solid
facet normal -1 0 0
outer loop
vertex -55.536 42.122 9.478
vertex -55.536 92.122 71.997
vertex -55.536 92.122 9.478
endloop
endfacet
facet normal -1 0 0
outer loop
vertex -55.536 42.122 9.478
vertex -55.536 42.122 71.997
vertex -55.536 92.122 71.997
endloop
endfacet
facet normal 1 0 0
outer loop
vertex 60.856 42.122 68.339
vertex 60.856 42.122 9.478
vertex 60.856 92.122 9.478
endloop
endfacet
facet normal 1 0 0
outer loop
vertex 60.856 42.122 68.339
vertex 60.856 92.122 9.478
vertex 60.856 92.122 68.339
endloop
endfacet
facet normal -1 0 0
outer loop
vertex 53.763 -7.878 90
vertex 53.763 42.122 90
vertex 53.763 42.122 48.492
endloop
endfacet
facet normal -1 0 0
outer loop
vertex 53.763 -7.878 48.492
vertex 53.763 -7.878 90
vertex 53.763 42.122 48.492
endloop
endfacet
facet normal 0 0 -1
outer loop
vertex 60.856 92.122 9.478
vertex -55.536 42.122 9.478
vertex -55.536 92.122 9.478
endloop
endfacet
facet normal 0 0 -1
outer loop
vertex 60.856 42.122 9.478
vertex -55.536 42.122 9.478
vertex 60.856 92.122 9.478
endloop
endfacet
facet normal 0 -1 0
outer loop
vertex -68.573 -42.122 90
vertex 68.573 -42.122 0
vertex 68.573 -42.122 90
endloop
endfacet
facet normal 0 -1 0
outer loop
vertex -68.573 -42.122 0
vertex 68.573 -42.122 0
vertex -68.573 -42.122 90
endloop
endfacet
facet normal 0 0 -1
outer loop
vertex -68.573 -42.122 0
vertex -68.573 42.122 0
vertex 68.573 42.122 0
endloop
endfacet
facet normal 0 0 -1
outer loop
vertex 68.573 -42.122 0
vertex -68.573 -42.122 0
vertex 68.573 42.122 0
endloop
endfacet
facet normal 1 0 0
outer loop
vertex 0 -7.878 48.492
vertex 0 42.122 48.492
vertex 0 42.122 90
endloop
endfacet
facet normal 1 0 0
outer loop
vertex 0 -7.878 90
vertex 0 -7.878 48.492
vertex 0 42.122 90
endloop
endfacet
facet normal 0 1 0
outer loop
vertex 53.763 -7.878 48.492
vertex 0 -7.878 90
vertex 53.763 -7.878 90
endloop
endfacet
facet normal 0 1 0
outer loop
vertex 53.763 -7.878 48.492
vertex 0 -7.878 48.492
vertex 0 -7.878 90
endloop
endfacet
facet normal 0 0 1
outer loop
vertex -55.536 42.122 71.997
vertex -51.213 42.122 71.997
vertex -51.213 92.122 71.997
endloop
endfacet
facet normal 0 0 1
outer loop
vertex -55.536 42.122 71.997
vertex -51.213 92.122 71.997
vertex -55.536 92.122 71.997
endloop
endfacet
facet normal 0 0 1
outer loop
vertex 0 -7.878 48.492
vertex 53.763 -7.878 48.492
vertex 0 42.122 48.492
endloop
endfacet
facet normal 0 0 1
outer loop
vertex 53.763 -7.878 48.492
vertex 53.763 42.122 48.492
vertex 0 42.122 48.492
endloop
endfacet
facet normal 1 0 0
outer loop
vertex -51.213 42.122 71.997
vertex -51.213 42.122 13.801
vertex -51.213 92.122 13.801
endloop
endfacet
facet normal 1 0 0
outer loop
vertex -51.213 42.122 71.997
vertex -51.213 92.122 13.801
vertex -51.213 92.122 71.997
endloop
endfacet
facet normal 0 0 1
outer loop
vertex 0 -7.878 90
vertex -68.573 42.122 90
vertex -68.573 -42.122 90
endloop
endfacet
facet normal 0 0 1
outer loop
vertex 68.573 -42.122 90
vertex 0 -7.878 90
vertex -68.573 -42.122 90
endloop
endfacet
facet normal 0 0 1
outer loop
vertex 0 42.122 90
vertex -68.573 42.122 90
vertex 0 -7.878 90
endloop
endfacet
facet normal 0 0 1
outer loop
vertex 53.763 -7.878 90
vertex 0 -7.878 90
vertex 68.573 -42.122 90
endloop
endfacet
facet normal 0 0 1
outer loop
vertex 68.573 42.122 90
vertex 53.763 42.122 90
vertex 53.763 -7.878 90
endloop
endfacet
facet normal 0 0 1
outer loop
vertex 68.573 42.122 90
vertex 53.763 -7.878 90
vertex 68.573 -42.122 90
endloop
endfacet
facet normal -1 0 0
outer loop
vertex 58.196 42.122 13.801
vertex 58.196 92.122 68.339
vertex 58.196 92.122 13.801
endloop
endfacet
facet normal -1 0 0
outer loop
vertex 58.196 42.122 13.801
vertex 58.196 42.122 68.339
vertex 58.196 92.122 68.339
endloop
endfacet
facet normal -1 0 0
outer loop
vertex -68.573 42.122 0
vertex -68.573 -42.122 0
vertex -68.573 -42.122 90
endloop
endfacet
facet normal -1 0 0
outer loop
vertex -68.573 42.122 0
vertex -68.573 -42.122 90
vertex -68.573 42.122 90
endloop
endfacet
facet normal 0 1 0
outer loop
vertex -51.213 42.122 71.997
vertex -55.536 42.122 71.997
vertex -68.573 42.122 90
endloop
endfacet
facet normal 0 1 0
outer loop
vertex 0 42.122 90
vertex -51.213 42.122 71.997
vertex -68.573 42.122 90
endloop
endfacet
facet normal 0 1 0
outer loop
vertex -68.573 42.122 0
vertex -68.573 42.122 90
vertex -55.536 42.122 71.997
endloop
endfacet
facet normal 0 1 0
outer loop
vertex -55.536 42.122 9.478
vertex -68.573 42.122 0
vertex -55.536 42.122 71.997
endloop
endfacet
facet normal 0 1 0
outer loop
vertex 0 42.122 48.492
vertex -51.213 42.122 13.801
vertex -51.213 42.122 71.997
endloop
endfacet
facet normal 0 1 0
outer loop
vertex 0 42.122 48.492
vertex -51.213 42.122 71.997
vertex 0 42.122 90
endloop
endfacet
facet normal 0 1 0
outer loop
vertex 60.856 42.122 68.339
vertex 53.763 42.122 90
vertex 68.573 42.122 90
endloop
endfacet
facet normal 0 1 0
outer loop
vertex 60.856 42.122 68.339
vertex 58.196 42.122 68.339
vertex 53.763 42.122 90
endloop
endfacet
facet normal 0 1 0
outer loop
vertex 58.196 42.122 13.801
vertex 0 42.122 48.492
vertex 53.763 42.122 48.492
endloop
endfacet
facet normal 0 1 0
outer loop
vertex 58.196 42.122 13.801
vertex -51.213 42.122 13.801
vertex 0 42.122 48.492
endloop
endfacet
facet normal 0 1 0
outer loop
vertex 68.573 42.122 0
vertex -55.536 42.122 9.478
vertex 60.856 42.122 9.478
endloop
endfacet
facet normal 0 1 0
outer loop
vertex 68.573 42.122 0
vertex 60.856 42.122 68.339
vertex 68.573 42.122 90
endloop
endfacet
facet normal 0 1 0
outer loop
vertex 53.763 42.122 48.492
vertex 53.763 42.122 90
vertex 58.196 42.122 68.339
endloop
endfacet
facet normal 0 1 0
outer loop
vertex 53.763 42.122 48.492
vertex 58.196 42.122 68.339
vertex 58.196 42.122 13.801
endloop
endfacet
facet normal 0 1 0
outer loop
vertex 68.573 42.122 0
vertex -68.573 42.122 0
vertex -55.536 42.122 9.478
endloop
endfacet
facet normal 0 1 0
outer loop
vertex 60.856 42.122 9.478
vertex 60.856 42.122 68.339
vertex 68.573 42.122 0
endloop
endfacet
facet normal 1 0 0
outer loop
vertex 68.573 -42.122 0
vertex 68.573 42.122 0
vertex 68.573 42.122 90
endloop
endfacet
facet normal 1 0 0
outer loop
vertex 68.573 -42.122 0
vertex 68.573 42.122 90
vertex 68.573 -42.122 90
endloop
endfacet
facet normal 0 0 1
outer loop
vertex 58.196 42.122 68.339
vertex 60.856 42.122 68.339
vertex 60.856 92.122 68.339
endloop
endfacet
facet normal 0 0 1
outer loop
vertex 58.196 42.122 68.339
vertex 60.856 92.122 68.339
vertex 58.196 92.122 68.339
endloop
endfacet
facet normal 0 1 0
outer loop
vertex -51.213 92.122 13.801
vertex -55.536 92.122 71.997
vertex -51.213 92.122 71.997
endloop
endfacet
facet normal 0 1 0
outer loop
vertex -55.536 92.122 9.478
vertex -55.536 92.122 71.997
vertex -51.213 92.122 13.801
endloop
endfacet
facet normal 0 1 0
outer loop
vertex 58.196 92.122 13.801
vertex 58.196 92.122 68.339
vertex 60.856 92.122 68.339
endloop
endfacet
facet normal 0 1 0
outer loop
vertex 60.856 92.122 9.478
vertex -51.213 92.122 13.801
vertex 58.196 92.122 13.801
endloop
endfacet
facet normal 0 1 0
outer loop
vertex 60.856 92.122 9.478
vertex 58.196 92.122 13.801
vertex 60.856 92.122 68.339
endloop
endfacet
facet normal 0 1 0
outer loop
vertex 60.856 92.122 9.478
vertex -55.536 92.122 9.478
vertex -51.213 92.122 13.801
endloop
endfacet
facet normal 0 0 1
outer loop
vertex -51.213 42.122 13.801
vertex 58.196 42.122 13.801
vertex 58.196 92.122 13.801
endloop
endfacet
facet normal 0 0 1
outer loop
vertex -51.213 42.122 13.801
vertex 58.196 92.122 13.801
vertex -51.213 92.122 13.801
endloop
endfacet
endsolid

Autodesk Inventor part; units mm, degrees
ref_plane "YZ Plane" through (0, 0, 0) normal (1, 0, 0) x (0, 1, 0)
ref_plane "XZ Plane" through (0, 0, 0) normal (0, 1, 0) x (-1, 0, 0)
ref_plane "XY Plane" through (0, 0, 0) normal (0, 0, 1) x (1, 0, 0)
sketch "스케치1" plane through (0, 0, 0) normal (0, 0, 1) x (1, 0, 0)
  line L0 (68.5732, -42.1218) -> (-68.5732, -42.1218)
  line L1 (-68.5732, -42.1218) -> (-68.5732, 42.1218)
  line L2 (-68.5732, 42.1218) -> (68.5732, 42.1218)
  line L3 (68.5732, 42.1218) -> (68.5732, -42.1218)
  line L4 (68.5732, -42.1218) -> (-68.5732, 42.1218) construction
  line L5 (-68.5732, -42.1218) -> (68.5732, 42.1218) construction
  point P0 (0, 0)
extrude "돌출1" add sketch "스케치1" along normal blind 90
sketch "스케치2" plane through (-68.5732, 42.1218, 0) normal (0, 1, 0) x (1, 0, 0)
  line L0 (0, -90) -> (137.1464, -90) projected
  line L1 (68.5732, -90) -> (122.3358, -90)
  line L2 (122.3358, -90) -> (122.3358, -48.4921)
  line L3 (122.3358, -48.4921) -> (68.5732, -48.4921)
  line L4 (68.5732, -48.4921) -> (68.5732, -90)
  point P0 (68.5732, 0)
extrude "돌출2" cut sketch "스케치2" against normal blind 50
sketch "스케치3" plane through (-68.5732, 42.1218, 0) normal (0, 1, 0) x (1, 0, 0)
  line L0 (13.0375, -71.9969) -> (13.0375, -9.4777)
  line L1 (13.0375, -9.4777) -> (129.4297, -9.4777)
  line L2 (129.4297, -9.4777) -> (129.4297, -68.3389)
  line L3 (129.4297, -68.3389) -> (126.7693, -68.3389)
  line L4 (126.7693, -68.3389) -> (126.7693, -13.8008)
  line L5 (126.7693, -13.8008) -> (17.3606, -13.8008)
  line L6 (17.3606, -13.8008) -> (17.3606, -71.9969)
  line L7 (17.3606, -71.9969) -> (13.0375, -71.9969)
  point P0 (68.5732, 0)
extrude "돌출3" add sketch "스케치3" along normal blind 50
properties part number "240503_3Dsketch02"
